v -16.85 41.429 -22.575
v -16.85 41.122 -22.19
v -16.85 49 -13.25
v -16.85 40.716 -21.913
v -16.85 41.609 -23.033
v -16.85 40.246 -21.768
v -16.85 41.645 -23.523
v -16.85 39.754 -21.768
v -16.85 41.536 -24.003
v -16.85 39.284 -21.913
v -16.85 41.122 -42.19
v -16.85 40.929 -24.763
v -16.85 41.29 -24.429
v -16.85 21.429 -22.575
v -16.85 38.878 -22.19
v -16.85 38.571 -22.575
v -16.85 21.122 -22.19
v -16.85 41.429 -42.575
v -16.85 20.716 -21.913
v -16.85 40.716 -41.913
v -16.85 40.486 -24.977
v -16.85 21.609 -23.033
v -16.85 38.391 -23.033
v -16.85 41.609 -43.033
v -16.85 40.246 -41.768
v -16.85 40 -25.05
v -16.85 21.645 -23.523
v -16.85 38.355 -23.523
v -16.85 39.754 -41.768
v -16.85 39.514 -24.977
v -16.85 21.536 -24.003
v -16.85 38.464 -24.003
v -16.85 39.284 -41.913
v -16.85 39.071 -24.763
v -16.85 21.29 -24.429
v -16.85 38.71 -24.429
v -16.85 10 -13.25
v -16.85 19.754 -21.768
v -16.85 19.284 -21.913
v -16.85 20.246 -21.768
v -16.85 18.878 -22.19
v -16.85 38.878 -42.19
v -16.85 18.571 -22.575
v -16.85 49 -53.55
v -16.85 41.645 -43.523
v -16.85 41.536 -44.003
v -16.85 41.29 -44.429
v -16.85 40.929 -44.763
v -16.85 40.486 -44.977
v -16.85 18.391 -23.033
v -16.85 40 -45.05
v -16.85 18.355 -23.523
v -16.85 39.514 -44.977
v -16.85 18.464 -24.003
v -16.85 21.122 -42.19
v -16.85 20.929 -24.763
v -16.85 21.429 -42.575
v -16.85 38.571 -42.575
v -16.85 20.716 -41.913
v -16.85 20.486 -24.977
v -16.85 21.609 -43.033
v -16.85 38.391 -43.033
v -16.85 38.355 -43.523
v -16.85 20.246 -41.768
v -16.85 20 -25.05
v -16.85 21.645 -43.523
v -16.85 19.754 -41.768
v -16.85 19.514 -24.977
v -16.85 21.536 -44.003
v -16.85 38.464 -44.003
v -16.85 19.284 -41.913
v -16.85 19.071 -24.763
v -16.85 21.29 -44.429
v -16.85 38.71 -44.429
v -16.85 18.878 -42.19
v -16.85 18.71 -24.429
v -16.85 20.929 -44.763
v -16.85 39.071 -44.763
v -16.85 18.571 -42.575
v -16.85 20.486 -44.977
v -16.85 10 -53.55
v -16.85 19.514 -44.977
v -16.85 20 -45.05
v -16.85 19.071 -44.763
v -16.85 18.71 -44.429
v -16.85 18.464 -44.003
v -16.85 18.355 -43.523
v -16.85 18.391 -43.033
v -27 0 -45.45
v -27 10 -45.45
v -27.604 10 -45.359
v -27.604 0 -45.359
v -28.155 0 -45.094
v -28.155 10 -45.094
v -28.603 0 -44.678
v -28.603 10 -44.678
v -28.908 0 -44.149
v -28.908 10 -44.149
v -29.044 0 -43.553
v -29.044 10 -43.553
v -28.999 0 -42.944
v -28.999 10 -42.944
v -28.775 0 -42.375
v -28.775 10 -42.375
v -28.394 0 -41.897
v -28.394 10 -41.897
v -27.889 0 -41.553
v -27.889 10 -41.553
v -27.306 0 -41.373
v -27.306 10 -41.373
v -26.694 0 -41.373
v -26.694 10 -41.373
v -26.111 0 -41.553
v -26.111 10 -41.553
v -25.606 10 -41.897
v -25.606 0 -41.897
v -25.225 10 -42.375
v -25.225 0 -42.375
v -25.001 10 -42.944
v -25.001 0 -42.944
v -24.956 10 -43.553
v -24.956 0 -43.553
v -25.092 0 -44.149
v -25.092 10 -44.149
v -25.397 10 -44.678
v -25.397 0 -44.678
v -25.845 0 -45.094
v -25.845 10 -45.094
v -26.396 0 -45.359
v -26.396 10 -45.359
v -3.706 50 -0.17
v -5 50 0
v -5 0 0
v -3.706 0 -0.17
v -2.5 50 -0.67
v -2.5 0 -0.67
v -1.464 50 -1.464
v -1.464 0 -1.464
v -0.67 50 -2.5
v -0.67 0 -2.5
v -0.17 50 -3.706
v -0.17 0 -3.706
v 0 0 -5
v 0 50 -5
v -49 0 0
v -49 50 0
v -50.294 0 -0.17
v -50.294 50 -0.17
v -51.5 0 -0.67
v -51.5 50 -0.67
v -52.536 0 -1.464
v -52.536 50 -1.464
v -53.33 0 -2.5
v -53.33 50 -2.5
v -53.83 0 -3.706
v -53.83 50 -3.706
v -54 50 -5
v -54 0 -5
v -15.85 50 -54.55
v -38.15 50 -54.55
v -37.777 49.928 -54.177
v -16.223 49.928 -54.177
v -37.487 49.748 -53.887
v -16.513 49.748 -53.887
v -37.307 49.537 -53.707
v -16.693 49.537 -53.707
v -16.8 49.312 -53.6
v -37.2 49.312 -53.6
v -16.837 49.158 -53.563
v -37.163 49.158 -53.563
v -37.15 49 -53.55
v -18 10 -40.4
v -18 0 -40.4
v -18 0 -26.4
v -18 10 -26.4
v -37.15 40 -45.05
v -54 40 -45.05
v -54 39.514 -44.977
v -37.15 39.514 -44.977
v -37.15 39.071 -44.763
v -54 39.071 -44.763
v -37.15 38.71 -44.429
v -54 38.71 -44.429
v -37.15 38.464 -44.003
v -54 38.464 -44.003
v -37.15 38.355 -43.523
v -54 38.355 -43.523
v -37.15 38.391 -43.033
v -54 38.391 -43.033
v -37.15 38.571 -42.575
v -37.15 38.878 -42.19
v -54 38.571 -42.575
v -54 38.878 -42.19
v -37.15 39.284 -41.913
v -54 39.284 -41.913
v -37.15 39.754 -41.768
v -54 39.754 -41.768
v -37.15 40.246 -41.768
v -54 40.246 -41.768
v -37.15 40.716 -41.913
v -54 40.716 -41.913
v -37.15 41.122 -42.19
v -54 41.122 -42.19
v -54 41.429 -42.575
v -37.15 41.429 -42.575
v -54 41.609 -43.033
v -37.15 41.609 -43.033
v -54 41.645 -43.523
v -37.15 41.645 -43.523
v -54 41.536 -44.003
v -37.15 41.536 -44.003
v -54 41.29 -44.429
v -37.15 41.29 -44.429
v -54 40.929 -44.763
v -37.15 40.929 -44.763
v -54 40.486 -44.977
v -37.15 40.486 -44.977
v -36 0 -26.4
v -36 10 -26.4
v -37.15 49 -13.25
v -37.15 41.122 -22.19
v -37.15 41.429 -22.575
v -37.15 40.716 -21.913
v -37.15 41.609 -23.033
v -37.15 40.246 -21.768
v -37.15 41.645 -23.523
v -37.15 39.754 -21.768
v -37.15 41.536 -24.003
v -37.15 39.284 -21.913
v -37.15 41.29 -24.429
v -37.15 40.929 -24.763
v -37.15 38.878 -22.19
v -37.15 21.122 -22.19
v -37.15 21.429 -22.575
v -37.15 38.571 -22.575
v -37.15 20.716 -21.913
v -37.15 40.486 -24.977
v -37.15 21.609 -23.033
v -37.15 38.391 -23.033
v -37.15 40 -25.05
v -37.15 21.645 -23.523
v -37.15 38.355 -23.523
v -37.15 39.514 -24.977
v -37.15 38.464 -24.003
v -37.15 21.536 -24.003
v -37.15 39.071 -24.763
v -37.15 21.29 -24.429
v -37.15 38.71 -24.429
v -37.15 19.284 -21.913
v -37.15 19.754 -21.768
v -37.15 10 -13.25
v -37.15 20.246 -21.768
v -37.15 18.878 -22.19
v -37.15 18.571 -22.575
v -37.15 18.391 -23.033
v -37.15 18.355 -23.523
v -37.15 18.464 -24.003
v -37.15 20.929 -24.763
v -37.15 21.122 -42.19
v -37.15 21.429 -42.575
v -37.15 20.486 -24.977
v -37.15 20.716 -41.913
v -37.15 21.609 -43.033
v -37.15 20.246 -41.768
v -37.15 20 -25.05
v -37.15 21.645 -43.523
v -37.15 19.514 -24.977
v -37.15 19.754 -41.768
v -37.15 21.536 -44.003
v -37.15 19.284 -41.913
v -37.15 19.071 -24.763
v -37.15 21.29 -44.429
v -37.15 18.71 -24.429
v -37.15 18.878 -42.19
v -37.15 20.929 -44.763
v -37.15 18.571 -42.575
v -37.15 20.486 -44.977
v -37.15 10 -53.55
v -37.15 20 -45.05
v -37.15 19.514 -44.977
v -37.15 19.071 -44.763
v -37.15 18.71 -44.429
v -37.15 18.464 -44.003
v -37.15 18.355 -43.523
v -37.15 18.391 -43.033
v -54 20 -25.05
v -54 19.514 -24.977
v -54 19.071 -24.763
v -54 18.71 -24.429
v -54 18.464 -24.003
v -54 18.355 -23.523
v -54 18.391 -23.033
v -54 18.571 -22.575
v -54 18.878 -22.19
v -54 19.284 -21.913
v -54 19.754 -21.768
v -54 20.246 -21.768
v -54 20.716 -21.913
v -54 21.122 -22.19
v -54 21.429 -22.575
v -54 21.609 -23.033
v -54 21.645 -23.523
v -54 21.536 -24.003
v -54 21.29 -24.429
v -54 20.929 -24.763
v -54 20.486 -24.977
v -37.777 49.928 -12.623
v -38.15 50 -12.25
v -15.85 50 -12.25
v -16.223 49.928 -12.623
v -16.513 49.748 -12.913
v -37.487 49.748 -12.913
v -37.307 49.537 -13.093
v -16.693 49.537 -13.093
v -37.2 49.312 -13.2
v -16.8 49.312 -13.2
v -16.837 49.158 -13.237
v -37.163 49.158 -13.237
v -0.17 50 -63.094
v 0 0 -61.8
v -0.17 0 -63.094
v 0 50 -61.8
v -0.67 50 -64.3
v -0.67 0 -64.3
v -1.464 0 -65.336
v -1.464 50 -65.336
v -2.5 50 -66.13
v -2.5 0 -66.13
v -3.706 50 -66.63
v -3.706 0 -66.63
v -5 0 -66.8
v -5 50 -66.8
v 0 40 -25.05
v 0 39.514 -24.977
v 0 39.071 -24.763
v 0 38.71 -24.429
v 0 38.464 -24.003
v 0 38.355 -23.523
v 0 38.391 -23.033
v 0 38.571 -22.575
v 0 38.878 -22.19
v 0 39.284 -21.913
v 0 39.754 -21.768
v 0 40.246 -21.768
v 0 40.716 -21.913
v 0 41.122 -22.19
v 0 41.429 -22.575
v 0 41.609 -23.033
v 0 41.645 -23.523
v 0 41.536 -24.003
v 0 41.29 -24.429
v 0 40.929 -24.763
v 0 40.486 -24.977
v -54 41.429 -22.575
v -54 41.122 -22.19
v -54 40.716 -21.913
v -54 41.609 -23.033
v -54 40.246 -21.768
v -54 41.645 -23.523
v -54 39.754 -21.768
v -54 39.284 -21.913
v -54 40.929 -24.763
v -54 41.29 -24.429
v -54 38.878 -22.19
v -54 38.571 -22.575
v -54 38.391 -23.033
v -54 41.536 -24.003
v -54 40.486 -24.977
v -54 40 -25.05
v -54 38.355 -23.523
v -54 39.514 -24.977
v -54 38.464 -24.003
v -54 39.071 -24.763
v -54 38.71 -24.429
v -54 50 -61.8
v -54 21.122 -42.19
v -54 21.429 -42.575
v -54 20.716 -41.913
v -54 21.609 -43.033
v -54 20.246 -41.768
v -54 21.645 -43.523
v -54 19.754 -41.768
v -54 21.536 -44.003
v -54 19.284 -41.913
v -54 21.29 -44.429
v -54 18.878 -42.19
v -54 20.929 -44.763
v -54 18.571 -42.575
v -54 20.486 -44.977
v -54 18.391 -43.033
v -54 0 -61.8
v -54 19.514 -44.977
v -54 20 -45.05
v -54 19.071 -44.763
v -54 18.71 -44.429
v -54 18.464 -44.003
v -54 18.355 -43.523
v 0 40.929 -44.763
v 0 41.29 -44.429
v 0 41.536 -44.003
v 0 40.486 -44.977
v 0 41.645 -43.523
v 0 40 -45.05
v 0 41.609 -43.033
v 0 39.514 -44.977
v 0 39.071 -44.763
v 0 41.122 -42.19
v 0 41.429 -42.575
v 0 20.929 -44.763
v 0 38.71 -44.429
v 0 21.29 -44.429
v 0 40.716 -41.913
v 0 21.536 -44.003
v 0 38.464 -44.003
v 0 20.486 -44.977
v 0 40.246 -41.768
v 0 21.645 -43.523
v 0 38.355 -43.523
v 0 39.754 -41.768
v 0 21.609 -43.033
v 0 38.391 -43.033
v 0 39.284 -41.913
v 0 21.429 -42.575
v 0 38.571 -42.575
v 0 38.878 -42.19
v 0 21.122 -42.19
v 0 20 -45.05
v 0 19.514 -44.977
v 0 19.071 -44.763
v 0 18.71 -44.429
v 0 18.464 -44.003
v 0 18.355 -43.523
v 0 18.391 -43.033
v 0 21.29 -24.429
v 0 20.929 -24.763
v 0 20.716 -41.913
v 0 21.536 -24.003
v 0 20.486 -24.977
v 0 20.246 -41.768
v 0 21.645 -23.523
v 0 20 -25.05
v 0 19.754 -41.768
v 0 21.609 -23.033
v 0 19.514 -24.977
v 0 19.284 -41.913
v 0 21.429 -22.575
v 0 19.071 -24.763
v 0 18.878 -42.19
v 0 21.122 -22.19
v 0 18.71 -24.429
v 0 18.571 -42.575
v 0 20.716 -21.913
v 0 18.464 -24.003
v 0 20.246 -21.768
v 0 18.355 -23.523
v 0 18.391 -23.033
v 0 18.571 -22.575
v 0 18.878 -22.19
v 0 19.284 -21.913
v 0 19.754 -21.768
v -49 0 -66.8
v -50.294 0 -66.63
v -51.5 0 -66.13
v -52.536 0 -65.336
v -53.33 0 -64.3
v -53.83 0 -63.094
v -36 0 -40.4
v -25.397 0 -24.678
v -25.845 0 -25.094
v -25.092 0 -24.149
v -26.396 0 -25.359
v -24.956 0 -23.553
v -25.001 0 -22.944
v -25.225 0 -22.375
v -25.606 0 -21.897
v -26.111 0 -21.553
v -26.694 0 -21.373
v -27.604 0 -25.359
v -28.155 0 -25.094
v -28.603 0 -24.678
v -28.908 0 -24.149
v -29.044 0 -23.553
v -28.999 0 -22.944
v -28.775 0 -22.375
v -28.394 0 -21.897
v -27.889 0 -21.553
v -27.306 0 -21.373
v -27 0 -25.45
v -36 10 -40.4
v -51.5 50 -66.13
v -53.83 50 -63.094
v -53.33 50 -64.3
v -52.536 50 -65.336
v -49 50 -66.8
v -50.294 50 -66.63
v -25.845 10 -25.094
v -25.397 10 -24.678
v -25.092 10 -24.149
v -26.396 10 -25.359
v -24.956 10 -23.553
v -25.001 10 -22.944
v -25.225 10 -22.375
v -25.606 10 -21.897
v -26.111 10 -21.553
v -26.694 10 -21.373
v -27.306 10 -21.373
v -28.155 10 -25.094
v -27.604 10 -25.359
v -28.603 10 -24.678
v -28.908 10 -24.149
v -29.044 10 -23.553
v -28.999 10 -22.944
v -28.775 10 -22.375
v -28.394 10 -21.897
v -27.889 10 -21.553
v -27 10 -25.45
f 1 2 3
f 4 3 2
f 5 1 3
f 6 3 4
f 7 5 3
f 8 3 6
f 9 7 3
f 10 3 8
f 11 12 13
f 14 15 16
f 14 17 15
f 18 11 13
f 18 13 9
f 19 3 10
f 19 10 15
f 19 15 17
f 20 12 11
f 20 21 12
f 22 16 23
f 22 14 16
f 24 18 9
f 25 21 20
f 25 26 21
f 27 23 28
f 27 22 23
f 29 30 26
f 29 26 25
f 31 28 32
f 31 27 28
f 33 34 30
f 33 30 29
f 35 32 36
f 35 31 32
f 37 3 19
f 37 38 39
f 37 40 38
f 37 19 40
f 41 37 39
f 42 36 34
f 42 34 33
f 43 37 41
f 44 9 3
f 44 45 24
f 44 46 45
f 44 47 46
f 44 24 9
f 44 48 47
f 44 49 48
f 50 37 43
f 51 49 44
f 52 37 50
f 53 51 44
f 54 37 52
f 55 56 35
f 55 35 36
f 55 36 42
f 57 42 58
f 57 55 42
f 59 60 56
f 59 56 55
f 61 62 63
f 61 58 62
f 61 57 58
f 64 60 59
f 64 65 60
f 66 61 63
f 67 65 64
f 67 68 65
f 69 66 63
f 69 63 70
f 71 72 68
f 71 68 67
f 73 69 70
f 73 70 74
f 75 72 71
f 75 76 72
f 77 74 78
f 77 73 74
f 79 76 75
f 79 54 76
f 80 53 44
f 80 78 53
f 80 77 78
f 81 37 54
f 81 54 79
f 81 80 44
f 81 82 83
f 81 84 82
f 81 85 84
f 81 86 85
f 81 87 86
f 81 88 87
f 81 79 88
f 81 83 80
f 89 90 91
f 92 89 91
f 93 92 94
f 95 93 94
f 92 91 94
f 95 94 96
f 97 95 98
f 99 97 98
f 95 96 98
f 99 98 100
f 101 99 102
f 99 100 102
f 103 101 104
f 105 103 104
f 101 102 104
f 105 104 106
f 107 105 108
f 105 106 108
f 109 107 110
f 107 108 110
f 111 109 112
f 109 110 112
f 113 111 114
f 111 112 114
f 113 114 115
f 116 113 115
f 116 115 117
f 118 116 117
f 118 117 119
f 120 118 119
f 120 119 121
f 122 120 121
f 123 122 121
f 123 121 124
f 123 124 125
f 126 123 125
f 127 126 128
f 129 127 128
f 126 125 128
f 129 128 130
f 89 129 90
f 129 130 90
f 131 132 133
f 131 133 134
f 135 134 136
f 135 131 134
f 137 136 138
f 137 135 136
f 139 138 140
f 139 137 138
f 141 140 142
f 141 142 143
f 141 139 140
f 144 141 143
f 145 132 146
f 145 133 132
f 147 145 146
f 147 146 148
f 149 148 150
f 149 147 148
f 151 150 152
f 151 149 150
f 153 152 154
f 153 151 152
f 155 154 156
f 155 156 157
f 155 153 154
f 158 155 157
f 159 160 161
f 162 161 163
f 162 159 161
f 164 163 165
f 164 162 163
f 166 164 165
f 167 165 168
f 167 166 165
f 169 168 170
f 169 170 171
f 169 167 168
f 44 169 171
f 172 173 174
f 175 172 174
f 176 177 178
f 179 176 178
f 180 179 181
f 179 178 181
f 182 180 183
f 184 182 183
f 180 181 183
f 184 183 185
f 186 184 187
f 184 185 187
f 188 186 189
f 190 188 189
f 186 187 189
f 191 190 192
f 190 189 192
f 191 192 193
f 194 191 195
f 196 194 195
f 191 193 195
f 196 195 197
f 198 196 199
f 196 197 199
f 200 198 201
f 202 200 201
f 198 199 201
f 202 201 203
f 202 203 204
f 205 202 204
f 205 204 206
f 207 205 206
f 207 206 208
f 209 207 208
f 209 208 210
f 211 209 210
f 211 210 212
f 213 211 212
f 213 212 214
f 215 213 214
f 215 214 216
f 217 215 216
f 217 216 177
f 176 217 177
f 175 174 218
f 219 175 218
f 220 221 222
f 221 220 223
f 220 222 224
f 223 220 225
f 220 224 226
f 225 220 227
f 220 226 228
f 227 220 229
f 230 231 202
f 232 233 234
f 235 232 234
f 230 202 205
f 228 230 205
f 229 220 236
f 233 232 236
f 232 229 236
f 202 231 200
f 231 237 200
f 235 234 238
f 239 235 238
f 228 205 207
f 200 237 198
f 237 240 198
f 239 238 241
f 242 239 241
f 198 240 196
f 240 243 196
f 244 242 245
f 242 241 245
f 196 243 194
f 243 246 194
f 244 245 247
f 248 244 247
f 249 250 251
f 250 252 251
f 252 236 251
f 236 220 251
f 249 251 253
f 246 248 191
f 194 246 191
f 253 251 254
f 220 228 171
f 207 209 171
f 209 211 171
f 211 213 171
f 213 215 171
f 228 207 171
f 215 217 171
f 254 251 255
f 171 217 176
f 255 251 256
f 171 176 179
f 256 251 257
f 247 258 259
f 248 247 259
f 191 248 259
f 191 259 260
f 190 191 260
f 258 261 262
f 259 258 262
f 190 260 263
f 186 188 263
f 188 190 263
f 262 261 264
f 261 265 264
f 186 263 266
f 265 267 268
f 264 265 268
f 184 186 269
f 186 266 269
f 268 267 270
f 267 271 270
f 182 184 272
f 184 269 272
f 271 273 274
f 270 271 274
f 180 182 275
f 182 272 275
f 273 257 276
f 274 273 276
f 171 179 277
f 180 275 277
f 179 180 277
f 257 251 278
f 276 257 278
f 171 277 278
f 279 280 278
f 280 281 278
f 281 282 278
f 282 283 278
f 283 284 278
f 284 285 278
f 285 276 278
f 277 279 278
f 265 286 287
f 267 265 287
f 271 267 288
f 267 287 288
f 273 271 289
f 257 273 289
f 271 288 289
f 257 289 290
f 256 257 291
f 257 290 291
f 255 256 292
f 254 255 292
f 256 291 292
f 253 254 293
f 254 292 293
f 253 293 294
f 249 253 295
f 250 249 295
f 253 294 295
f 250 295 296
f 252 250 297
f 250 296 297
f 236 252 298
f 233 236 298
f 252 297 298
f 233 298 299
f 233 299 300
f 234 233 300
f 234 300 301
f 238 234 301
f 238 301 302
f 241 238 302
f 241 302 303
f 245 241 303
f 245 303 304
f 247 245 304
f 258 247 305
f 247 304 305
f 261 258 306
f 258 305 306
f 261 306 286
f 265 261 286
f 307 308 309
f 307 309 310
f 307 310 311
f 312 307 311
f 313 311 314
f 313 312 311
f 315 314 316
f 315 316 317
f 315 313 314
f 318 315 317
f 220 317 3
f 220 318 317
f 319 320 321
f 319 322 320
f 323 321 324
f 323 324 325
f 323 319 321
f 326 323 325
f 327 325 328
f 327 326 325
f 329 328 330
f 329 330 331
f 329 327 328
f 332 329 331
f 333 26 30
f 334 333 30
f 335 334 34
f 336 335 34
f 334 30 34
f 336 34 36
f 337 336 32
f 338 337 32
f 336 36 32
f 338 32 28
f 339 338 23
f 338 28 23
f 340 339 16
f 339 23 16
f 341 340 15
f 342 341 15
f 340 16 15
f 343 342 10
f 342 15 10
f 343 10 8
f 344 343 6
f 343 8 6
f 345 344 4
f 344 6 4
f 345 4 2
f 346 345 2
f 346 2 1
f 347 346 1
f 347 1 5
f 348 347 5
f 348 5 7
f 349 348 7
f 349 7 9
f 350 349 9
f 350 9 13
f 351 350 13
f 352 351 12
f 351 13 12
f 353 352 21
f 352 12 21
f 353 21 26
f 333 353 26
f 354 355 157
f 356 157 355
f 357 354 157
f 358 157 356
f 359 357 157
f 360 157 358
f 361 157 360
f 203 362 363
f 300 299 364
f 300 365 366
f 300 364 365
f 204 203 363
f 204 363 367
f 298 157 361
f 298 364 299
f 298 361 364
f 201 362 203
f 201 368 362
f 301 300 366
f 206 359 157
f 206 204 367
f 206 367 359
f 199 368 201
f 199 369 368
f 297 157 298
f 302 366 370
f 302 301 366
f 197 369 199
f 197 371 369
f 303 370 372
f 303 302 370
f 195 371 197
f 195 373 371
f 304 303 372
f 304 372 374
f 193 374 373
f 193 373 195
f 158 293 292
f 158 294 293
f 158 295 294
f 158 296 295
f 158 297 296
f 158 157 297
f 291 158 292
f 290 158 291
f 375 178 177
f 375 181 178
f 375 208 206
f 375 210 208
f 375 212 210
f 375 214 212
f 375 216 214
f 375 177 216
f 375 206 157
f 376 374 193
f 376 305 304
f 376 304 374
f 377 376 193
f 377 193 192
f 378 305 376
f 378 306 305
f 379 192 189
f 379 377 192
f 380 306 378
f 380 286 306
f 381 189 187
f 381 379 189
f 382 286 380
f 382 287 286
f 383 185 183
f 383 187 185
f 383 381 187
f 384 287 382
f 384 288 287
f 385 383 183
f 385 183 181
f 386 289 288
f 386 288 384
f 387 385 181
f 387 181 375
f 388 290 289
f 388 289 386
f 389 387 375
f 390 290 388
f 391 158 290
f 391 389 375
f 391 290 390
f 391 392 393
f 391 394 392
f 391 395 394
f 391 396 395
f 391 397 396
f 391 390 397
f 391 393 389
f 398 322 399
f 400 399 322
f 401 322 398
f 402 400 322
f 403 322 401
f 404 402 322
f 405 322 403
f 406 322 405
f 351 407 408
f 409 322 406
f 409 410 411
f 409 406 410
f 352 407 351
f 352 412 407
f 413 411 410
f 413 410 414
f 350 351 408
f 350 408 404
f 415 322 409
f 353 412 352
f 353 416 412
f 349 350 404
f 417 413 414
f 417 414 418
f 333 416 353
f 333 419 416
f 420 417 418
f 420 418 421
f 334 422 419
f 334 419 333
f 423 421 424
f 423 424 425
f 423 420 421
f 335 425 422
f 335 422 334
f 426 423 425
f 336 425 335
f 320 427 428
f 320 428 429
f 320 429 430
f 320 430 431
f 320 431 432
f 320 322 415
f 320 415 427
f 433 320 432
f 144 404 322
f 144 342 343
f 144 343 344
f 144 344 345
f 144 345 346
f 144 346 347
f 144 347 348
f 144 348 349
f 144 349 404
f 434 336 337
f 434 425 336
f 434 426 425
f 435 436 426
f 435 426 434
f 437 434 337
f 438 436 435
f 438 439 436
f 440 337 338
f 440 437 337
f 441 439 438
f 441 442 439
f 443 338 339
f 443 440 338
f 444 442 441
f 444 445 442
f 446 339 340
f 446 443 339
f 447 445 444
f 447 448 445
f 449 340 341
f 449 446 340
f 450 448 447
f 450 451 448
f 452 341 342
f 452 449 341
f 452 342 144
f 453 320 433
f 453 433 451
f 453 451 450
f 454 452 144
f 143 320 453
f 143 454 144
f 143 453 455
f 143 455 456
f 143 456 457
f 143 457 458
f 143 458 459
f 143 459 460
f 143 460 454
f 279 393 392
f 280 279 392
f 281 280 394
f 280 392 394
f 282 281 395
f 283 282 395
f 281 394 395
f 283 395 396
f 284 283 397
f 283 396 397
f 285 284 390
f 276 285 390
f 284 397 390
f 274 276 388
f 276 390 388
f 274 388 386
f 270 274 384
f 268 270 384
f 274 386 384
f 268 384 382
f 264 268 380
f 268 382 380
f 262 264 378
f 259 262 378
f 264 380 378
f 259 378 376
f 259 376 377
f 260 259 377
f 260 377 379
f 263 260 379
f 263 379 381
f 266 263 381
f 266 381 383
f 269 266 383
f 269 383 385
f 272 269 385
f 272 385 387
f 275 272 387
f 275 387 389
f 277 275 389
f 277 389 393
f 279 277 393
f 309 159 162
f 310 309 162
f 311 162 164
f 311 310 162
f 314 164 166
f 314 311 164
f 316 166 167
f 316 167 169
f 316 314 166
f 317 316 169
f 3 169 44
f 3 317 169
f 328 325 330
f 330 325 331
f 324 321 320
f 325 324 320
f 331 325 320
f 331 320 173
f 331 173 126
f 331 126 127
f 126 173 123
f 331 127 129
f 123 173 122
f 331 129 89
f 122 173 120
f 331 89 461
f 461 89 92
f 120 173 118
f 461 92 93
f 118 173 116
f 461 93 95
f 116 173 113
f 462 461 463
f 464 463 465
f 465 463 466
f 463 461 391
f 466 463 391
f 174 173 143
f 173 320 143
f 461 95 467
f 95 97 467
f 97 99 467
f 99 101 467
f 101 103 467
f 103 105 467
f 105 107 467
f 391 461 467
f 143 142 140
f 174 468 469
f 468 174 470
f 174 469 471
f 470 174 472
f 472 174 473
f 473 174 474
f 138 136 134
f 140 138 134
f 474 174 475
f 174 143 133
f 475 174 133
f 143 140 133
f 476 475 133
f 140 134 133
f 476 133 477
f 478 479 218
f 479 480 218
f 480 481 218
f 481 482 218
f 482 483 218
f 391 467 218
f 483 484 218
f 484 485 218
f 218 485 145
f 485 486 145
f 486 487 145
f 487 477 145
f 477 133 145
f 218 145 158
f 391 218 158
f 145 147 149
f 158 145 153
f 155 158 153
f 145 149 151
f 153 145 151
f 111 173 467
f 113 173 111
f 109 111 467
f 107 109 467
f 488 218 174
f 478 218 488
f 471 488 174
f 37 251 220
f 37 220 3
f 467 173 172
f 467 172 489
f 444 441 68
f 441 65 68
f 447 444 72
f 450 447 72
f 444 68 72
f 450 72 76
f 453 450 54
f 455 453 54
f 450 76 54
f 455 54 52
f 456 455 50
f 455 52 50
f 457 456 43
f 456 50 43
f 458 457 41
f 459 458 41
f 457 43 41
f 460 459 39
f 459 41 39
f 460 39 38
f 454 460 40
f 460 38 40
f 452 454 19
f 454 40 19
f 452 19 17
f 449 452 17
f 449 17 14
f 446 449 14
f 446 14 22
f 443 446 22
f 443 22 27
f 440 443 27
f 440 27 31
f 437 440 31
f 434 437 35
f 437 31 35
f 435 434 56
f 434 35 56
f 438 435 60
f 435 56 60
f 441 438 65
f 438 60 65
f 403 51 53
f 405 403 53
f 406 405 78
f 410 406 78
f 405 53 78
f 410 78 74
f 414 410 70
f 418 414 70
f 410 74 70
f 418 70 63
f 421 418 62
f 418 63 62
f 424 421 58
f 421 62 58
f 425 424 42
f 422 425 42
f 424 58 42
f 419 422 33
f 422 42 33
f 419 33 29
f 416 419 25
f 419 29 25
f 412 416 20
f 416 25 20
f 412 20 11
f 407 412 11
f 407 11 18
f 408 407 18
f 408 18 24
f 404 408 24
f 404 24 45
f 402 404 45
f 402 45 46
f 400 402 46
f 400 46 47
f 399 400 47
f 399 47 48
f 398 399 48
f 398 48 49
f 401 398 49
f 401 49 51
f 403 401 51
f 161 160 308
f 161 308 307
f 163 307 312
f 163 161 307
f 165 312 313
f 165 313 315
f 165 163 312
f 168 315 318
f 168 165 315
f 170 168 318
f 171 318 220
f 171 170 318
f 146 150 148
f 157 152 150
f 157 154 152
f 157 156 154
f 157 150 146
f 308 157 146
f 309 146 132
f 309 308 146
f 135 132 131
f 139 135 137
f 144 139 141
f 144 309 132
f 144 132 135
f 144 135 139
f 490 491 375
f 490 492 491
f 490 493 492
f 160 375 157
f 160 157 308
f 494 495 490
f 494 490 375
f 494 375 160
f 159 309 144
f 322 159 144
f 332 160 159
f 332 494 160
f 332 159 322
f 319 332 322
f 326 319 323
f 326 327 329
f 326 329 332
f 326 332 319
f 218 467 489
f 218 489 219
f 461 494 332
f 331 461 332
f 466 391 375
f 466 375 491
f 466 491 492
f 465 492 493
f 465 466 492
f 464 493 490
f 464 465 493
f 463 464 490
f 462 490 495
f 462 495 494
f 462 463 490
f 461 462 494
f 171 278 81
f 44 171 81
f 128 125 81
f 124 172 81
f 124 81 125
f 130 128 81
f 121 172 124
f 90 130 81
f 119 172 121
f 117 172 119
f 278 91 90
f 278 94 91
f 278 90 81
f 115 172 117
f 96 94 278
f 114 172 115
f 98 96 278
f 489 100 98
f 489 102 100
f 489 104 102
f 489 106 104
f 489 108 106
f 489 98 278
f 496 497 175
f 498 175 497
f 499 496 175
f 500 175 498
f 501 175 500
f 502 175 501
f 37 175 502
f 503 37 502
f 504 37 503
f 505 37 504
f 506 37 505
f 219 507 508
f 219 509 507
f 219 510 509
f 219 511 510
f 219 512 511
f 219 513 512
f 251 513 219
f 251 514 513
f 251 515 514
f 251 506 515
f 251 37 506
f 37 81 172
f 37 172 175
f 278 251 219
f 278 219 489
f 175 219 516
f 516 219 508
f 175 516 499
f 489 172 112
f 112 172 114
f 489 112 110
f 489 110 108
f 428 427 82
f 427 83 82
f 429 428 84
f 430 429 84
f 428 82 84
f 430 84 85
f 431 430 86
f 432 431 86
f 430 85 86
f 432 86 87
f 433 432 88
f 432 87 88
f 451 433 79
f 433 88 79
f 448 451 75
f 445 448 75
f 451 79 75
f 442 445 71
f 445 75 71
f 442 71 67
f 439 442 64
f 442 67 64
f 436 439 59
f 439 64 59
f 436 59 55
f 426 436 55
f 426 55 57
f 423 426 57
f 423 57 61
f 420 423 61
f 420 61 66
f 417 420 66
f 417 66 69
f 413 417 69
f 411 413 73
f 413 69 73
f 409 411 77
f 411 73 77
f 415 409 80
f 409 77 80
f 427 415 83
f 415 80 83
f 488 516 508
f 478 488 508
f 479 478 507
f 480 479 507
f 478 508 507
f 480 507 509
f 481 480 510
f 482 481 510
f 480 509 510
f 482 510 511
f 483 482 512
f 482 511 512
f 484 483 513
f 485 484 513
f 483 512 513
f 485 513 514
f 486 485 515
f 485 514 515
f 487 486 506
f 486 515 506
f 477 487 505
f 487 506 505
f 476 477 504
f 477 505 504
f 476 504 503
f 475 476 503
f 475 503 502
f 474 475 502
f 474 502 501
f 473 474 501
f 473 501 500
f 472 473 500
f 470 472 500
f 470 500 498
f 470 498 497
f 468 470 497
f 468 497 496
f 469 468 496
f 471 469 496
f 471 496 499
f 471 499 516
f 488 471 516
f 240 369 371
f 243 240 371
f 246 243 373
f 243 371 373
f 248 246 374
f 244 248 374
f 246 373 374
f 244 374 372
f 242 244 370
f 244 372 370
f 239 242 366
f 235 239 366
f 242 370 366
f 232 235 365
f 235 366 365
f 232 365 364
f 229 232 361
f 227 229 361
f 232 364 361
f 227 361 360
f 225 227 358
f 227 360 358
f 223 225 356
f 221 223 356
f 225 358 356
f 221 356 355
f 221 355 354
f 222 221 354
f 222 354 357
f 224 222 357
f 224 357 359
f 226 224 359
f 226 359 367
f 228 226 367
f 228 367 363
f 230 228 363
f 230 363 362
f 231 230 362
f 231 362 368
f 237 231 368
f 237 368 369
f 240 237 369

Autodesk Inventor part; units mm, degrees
ref_plane "YZ Plane" through (0, 0, 0) normal (1, 0, 0) x (0, 1, 0)
ref_plane "XZ Plane" through (0, 0, 0) normal (0, 1, 0) x (-1, 0, 0)
ref_plane "XY Plane" through (0, 0, 0) normal (0, 0, 1) x (1, 0, 0)
sketch "スケッチ1" plane through (0, 0, 0) normal (0, 1, 0) x (-1, 0, 0)
  line L0 (0, 0) -> (54, 0)
  line L1 (54, 0) -> (54, -66.8)
  line L2 (54, -66.8) -> (0, -66.8)
  line L3 (0, -66.8) -> (0, 0)
  dimension "d0" = 54
  dimension "d1" = 66.8
extrude "押し出し1" add sketch "スケッチ1" along normal blind 10
sketch "スケッチ2" plane through (0, 10, 0) normal (0, 1, 0) x (1, 0, 0)
  line L0 (-54, 66.8) -> (-54, 0) projected
  line L1 (-54, 0) -> (0, 0) projected
  line L2 (-27, 0) -> (-27, 66.8)
  line L3 (0, 66.8) -> (-54, 66.8) projected
  line L4 (-54, 33.4) -> (0, 33.4)
  line L5 (0, 0) -> (0, 66.8) projected
  line L6 (-27, 33.4) -> (-37.15, 33.4)
  line L7 (-37.15, 33.4) -> (-37.15, 53.55)
  line L8 (-37.15, 53.55) -> (-27, 53.55)
  line L9 (-27, 53.55) -> (-27, 33.4)
  line L10 (-37.15, 33.4) -> (-37.15, 13.25)
  line L11 (-37.15, 13.25) -> (-27, 13.25)
  line L12 (-16.85, 33.4) -> (-16.85, 53.55)
  line L13 (-16.85, 53.55) -> (-27, 53.55)
  line L14 (-16.85, 33.4) -> (-16.85, 13.25)
  line L15 (-16.85, 13.25) -> (-27, 13.25)
  dimension "d7" = 20.15
  dimension "d8" = 10.15
extrude "押し出し2" add sketch "スケッチ2" along normal blind 40 contours L3 L2 L8 L7 L4 L0 | L4 L10 L11 L2 L1 L0 | L3 L5 L4 L12 L13 L2 | L2 L15 L14 L4 L5 L1
fillet "フィレット1" radius 5 4 edges at (0, 25, 0) (0, 25, -66.8) (-54, 25, -66.8) (-54, 25, 0)
sketch "スケッチ3" plane through (0, 0, -5) normal (1, 0, 0) x (0, 0, -1)
  line L0 (48.55, 50) -> (8.25, 50) projected
  line L1 (28.4, 50) -> (28.4, 0)
  line L2 (0, 0) -> (56.8, 0) projected
  line L3 (18.4, 50) -> (18.4, 0)
  line L4 (0, 50) -> (0, 0) projected
  line L5 (0, 10) -> (62, 10)
  line L6 (8.25, 10) -> (48.55, 10) projected
  point P0 (-5, 0)
  point P1 (18.4, 20)
  point P2 (18.4, 40)
  point P3 (38.4, 20)
  point P4 (38.4, 40)
  dimension "d12" = 10
  dimension "d13" = 10
  dimension "d14" = 10
  dimension "d15" = 20
hole "穴1" at (0, 20, -23.4) at (0, 40, -23.4) at (0, 40, -43.4) at (0, 20, -43.4) direction (-1, 0, 0) diameter 3.3 end through all
sketch "スケッチ4" plane through (0, 0, 0) normal (0, -1, 0) x (1, 0, 0)
  line L0 (-5, -66.8) -> (-49, -66.8) projected
  line L1 (-27, -66.8) -> (-27, 0)
  line L2 (-49, 0) -> (-5, 0) projected
  line L3 (-54, -61.8) -> (-54, -5) projected
  line L4 (-54, -33.4) -> (0, -33.4)
  line L5 (0, -5) -> (0, -61.8) projected
  point P0 (0, 0)
  point P1 (-27, -43.4)
  point P2 (-27, -23.4)
  dimension "d23" = 10
  dimension "d24" = 10
hole "穴2" at (-27, 0, -43.4) at (-27, 0, -23.4) direction (0, 1, 0) diameter 4.1 end through all
fillet "フィレット2" radius 1 4 edges at (-37.15, 50, -33.4) (-27, 50, -13.25) (-16.85, 50, -33.4) (-27, 50, -53.55)
sketch "スケッチ5" plane through (0, 0, 0) normal (0, -1, 0) x (1, 0, 0)
  circle A0 centre (-27, -23.4) radius 2.05 projected
  circle A1 centre (-27, -43.4) radius 2.05 projected
  line L0 (-27, -23.4) -> (-27, -43.4)
  line L1 (-27, -33.4) -> (-18, -33.4)
  line L2 (-18, -33.4) -> (-18, -40.4)
  line L3 (-18, -40.4) -> (-27, -40.4)
  line L4 (-27, -40.4) -> (-27, -33.4)
  line L5 (-18, -33.4) -> (-18, -26.4)
  line L6 (-18, -26.4) -> (-27, -26.4)
  line L7 (-36, -33.4) -> (-36, -40.4)
  line L8 (-36, -40.4) -> (-27, -40.4)
  line L9 (-36, -33.4) -> (-36, -26.4)
  line L10 (-36, -26.4) -> (-27, -26.4)
  point P0 (0, 0)
  dimension "d33" = 7
  dimension "d34" = 9
extrude "押し出し3" cut sketch "スケッチ5" against normal blind 10 contours L6 L5 L1 L0 | L0 L8 L7 L9 L10 | L1 L2 L3 L0
properties part number "framefixpart1_v2"
